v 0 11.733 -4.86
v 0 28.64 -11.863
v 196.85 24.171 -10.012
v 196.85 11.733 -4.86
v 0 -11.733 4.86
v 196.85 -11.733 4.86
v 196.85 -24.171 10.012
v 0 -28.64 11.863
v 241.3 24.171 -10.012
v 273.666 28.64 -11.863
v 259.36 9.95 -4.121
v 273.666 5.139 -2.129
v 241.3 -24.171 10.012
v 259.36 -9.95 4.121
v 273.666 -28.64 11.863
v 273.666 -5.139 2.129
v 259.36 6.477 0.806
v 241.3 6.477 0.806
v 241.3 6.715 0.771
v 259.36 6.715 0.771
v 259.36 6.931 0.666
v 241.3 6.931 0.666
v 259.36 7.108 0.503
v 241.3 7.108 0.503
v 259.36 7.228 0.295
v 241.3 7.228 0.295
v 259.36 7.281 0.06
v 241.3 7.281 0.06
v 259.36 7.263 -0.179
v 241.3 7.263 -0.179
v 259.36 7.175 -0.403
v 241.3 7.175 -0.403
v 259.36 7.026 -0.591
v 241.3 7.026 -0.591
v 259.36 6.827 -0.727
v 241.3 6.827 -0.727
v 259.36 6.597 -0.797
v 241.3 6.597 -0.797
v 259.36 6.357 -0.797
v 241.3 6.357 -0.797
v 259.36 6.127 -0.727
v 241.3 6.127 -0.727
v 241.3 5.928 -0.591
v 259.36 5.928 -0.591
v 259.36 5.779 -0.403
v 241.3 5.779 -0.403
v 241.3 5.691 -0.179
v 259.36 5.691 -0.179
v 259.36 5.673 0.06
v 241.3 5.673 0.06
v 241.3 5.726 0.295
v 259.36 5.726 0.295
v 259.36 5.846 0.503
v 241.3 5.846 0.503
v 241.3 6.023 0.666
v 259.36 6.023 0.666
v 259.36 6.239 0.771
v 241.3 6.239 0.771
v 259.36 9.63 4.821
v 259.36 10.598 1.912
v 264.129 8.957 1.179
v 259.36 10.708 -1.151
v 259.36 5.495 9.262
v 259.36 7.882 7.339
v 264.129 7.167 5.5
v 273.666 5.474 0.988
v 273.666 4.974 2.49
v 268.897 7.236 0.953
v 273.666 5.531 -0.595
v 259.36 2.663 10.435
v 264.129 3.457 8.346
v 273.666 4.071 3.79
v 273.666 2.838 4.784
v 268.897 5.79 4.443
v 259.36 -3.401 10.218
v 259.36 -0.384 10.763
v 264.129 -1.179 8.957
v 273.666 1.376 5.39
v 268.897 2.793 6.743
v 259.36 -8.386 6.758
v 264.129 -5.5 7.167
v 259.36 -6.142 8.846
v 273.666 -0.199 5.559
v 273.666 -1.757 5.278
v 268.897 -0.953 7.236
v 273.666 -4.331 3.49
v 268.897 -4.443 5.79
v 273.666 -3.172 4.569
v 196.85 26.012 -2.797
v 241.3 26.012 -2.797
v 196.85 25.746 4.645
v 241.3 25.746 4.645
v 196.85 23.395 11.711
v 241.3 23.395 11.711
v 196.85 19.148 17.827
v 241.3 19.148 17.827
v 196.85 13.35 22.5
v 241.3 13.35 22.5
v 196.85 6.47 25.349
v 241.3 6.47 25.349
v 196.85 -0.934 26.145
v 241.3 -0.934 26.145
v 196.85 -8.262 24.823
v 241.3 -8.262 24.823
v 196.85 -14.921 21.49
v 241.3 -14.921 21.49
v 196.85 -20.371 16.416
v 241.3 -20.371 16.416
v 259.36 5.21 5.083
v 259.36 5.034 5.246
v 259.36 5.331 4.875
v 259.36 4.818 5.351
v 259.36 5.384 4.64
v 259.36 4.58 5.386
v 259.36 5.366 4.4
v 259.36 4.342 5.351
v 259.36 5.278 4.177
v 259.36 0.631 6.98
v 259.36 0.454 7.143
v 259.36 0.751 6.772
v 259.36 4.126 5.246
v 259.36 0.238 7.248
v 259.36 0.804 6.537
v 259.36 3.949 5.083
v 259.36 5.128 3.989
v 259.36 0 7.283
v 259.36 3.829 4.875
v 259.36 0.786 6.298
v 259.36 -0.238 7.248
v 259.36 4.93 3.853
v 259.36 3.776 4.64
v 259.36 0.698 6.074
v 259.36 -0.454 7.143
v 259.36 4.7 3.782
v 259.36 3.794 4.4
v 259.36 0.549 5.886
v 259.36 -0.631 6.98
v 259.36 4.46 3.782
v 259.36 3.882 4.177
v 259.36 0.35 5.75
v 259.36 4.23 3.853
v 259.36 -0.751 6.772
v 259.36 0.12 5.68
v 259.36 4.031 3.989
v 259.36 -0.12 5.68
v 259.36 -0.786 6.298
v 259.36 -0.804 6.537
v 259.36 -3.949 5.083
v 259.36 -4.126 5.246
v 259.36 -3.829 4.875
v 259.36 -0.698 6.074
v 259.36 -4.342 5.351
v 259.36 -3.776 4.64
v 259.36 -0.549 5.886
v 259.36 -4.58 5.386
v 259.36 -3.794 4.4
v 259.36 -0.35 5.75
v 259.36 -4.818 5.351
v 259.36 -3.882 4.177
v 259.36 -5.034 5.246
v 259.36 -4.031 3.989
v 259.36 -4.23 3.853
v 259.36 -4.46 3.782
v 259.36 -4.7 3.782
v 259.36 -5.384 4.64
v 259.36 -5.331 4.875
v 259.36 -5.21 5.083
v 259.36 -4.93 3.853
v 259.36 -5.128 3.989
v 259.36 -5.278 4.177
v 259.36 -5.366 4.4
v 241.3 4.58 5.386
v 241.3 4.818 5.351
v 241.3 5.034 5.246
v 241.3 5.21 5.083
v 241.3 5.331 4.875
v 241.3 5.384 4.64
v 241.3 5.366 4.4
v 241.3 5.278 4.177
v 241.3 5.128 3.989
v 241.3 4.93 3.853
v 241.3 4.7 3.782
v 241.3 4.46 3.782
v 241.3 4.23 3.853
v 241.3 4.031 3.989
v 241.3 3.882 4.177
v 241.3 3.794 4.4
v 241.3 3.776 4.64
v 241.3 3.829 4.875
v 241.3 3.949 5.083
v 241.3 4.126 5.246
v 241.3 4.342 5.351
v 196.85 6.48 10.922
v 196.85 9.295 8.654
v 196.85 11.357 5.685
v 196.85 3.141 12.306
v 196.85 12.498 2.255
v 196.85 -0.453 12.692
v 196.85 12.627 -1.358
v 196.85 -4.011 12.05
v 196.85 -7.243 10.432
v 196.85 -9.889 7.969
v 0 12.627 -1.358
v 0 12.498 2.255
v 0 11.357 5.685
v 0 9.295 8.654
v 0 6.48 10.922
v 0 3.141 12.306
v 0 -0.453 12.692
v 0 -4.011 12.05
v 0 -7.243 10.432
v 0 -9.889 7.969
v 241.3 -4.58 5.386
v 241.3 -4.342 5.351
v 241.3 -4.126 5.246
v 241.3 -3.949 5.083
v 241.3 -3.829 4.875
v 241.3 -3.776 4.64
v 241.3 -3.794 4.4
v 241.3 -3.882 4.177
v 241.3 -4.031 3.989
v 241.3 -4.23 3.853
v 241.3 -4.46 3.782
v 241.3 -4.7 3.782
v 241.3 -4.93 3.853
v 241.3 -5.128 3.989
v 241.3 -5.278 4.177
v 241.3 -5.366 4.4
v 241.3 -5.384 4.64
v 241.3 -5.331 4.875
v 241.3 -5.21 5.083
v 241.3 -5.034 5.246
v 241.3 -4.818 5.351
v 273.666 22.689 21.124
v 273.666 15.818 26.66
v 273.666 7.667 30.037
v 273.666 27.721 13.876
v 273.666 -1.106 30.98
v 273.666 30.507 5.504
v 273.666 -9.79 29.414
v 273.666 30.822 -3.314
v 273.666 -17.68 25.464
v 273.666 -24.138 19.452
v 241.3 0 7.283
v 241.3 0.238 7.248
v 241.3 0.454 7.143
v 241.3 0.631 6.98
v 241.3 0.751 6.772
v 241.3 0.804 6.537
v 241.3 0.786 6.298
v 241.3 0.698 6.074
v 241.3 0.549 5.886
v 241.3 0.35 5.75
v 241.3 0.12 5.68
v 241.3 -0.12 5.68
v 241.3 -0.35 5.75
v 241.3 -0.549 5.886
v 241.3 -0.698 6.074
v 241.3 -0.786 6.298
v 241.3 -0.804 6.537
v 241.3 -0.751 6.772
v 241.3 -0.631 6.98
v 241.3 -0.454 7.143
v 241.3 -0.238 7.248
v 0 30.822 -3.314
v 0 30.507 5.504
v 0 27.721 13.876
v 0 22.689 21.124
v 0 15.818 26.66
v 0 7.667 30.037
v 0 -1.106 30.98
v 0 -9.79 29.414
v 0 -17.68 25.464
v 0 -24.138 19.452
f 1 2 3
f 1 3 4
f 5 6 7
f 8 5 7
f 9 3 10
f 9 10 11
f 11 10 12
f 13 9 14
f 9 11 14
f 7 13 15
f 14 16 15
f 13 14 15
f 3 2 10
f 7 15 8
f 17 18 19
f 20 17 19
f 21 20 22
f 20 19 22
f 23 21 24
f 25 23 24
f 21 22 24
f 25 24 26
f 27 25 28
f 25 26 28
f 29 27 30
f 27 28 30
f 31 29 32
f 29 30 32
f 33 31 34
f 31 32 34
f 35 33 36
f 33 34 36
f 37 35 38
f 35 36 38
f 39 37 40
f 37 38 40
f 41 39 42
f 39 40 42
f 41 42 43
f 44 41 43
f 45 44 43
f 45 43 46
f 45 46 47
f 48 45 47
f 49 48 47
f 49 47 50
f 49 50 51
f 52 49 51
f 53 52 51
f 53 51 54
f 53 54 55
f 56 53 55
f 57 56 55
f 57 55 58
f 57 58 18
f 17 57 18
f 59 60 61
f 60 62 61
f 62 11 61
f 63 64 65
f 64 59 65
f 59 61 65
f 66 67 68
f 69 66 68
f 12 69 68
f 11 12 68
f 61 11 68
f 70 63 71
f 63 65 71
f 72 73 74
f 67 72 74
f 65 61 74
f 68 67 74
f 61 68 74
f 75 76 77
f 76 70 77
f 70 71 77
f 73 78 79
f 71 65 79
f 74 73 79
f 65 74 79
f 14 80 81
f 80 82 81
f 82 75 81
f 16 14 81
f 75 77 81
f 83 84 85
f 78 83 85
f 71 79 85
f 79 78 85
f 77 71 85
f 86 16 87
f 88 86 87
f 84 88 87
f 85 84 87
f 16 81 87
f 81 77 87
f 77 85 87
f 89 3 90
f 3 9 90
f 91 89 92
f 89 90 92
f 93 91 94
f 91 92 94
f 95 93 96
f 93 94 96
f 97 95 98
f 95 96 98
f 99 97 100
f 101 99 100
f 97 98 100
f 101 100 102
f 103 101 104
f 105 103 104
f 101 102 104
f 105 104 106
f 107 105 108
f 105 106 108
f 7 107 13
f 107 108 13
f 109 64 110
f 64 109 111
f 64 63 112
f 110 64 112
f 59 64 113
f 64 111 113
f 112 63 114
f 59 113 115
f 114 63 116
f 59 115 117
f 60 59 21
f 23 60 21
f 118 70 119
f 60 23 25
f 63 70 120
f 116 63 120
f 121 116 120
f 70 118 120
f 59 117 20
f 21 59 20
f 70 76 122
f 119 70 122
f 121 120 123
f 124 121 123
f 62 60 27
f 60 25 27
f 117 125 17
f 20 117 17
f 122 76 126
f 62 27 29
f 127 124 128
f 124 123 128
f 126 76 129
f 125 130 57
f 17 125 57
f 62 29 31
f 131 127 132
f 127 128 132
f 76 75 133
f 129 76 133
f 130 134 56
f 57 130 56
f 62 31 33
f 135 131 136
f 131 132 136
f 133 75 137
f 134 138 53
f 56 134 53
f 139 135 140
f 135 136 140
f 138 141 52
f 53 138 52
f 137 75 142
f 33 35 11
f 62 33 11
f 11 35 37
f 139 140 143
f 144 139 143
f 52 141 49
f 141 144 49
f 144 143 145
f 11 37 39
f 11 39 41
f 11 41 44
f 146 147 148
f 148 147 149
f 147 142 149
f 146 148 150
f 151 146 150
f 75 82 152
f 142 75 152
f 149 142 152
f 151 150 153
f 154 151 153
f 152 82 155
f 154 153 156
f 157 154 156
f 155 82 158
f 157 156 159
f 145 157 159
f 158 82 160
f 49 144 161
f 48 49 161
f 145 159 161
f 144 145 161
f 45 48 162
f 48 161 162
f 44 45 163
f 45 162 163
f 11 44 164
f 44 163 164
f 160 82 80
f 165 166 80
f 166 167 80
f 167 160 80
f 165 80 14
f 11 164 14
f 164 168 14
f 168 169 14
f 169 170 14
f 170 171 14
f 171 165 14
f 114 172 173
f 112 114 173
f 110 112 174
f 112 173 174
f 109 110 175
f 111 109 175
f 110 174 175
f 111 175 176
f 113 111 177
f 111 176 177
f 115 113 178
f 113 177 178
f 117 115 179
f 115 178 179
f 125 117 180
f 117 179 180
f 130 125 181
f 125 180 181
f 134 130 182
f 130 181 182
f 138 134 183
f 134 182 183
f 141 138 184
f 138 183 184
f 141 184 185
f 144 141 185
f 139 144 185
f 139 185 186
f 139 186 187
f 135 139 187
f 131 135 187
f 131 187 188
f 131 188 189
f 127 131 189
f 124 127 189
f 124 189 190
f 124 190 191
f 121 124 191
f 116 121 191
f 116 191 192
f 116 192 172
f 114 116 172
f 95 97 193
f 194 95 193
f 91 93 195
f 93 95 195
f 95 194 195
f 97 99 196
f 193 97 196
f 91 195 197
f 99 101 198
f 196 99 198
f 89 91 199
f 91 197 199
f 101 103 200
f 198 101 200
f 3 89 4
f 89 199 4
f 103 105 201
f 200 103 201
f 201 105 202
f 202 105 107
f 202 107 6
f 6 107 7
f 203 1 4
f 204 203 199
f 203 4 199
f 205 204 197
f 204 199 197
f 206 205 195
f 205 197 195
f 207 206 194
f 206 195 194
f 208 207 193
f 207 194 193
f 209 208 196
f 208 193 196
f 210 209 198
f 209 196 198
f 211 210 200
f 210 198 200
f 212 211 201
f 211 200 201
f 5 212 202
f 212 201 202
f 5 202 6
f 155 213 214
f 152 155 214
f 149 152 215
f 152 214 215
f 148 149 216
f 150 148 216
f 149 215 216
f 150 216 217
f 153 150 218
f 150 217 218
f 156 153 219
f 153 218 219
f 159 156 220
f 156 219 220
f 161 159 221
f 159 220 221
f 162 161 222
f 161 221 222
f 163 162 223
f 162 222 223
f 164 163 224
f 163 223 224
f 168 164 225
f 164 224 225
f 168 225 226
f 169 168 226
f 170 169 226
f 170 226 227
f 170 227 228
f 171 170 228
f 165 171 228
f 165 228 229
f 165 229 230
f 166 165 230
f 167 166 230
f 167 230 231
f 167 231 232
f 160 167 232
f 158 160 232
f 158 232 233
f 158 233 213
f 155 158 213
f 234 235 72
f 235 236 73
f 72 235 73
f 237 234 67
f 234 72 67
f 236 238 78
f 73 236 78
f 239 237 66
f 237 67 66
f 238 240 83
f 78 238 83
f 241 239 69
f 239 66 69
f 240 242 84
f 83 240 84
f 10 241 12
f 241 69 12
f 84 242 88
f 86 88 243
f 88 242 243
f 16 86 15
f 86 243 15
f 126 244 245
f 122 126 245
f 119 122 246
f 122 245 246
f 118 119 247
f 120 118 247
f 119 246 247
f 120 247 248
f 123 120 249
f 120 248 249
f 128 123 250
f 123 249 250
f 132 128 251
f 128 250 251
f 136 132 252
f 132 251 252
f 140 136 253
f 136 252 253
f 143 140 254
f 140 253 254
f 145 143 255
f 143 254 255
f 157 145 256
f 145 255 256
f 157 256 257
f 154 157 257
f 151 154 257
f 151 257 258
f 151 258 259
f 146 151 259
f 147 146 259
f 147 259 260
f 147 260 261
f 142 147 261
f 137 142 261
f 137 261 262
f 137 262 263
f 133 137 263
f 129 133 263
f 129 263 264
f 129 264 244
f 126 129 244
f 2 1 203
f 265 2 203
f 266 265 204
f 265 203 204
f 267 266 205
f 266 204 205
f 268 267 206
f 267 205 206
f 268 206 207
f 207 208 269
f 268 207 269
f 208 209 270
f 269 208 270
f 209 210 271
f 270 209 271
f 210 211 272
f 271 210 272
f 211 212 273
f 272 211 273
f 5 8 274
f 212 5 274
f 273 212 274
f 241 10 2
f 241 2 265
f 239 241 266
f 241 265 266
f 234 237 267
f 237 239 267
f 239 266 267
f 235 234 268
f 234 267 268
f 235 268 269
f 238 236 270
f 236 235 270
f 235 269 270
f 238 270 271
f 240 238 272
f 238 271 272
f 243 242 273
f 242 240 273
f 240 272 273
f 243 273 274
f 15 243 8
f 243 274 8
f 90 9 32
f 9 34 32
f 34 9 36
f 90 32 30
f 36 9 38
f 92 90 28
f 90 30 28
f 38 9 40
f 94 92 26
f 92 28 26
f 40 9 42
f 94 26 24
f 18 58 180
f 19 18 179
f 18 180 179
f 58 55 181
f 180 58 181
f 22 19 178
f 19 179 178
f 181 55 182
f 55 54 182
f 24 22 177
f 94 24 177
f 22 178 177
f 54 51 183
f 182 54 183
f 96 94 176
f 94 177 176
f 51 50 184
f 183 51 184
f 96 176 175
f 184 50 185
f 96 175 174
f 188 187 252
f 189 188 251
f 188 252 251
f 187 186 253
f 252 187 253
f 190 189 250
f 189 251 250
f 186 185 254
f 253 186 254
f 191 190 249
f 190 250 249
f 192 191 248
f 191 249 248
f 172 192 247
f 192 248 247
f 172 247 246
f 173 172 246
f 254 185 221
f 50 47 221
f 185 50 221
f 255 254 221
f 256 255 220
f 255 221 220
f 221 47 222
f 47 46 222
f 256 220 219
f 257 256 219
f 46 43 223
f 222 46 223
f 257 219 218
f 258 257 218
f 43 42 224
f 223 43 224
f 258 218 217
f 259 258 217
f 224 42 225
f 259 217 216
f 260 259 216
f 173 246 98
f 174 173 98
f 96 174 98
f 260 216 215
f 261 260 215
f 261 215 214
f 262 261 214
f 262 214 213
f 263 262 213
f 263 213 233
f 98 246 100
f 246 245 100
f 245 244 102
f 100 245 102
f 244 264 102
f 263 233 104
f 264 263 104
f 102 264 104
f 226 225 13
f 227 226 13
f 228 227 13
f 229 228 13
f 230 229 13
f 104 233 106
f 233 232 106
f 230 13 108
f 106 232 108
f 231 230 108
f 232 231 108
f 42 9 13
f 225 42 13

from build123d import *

# Parameters (mm, degrees)
CUT_EXTRUDE1_REACH = 247.25
SKETCH3_R          = 0.80645
SKETCH4_W          = 62
SKETCH4_H          = 273.6661
CUT_EXTRUDE2_DEPTH = 278.155433447


with BuildPart() as part:
    # Sketch1 → Revolve1 (revolve)
    with BuildSketch(Plane.XY, mode=Mode.PRIVATE) as revolve1_sk:
        Polygon((0, 12.7), (196.85, 12.7), (196.85, 26.162), (241.3, 26.162), (241.3, 0), (259.36, 0), (259.36, 10.7696), (273.6661, 5.5626), (273.6661, 31), (0, 31), align=None)
    revolve(revolve1_sk.sketch.rotate(Axis((0, 0, 0), (1, 0, 0)), 90), axis=Axis((0, 0, 0), (1, 0, 0)))

    # Sketch3 → Cut-Extrude1 (cut, up to next)
    with BuildSketch(Plane.ZY.offset(-241.3), mode=Mode.PRIVATE) as cut_extrude1_sk1:
        with Locations((0, 6.477)):
            Circle(SKETCH3_R)
    cut_extrude1_tool1 = extrude(cut_extrude1_sk1.sketch, amount=-CUT_EXTRUDE1_REACH, mode=Mode.PRIVATE) & part.part
    # Sketch3 → Cut-Extrude1 (cut, up to next)
    with BuildSketch(Plane.ZY.offset(-241.3), mode=Mode.PRIVATE) as cut_extrude1_sk2:
        with Locations((4.579930622, 4.579930622)):
            Circle(SKETCH3_R)
    cut_extrude1_tool2 = extrude(cut_extrude1_sk2.sketch, amount=-CUT_EXTRUDE1_REACH, mode=Mode.PRIVATE) & part.part
    # Sketch3 → Cut-Extrude1 (cut, up to next)
    with BuildSketch(Plane.ZY.offset(-241.3), mode=Mode.PRIVATE) as cut_extrude1_sk3:
        with Locations((6.477, 0)):
            Circle(SKETCH3_R)
    cut_extrude1_tool3 = extrude(cut_extrude1_sk3.sketch, amount=-CUT_EXTRUDE1_REACH, mode=Mode.PRIVATE) & part.part
    # Sketch3 → Cut-Extrude1 (cut, up to next)
    with BuildSketch(Plane.ZY.offset(-241.3), mode=Mode.PRIVATE) as cut_extrude1_sk4:
        with Locations((4.579930622, -4.579930622)):
            Circle(SKETCH3_R)
    cut_extrude1_tool4 = extrude(cut_extrude1_sk4.sketch, amount=-CUT_EXTRUDE1_REACH, mode=Mode.PRIVATE) & part.part
    # Sketch3 → Cut-Extrude1 (cut, up to next)
    with BuildSketch(Plane.ZY.offset(-241.3), mode=Mode.PRIVATE) as cut_extrude1_sk5:
        with Locations((0, -6.477)):
            Circle(SKETCH3_R)
    cut_extrude1_tool5 = extrude(cut_extrude1_sk5.sketch, amount=-CUT_EXTRUDE1_REACH, mode=Mode.PRIVATE) & part.part
    # Sketch3 → Cut-Extrude1 (cut, up to next)
    with BuildSketch(Plane.ZY.offset(-241.3), mode=Mode.PRIVATE) as cut_extrude1_sk6:
        with Locations((-4.579930622, -4.579930622)):
            Circle(SKETCH3_R)
    cut_extrude1_tool6 = extrude(cut_extrude1_sk6.sketch, amount=-CUT_EXTRUDE1_REACH, mode=Mode.PRIVATE) & part.part
    # Sketch3 → Cut-Extrude1 (cut, up to next)
    with BuildSketch(Plane.ZY.offset(-241.3), mode=Mode.PRIVATE) as cut_extrude1_sk7:
        with Locations((-6.477, 0)):
            Circle(SKETCH3_R)
    cut_extrude1_tool7 = extrude(cut_extrude1_sk7.sketch, amount=-CUT_EXTRUDE1_REACH, mode=Mode.PRIVATE) & part.part
    # Sketch3 → Cut-Extrude1 (cut, up to next)
    with BuildSketch(Plane.ZY.offset(-241.3), mode=Mode.PRIVATE) as cut_extrude1_sk8:
        with Locations((-4.579930622, 4.579930622)):
            Circle(SKETCH3_R)
    cut_extrude1_tool8 = extrude(cut_extrude1_sk8.sketch, amount=-CUT_EXTRUDE1_REACH, mode=Mode.PRIVATE) & part.part
    add(cut_extrude1_tool1.solids().sort_by_distance((241.3, 6.477, 0))[0], mode=Mode.SUBTRACT)
    add(cut_extrude1_tool2.solids().sort_by_distance((241.3, 4.579931, 4.579931))[0], mode=Mode.SUBTRACT)
    add(cut_extrude1_tool3.solids().sort_by_distance((241.3, 0, 6.477))[0], mode=Mode.SUBTRACT)
    add(cut_extrude1_tool4.solids().sort_by_distance((241.3, -4.579931, 4.579931))[0], mode=Mode.SUBTRACT)
    add(cut_extrude1_tool5.solids().sort_by_distance((241.3, -6.477, 0))[0], mode=Mode.SUBTRACT)
    add(cut_extrude1_tool6.solids().sort_by_distance((241.3, -4.579931, -4.579931))[0], mode=Mode.SUBTRACT)
    add(cut_extrude1_tool7.solids().sort_by_distance((241.3, 0, -6.477))[0], mode=Mode.SUBTRACT)
    add(cut_extrude1_tool8.solids().sort_by_distance((241.3, 4.579931, -4.579931))[0], mode=Mode.SUBTRACT)

    # Sketch4 → Cut-Extrude2 (cut, through all)
    with BuildSketch(Plane(origin=(0, 0, 0), x_dir=(0, -0.9238795325112865, 0.38268343236509056), z_dir=(0, 0.3826834323650905, 0.9238795325112864))):
        with Locations((0, 136.83305)):
            Rectangle(SKETCH4_W, SKETCH4_H)
    extrude(amount=-CUT_EXTRUDE2_DEPTH, mode=Mode.SUBTRACT)


solid = part.part
